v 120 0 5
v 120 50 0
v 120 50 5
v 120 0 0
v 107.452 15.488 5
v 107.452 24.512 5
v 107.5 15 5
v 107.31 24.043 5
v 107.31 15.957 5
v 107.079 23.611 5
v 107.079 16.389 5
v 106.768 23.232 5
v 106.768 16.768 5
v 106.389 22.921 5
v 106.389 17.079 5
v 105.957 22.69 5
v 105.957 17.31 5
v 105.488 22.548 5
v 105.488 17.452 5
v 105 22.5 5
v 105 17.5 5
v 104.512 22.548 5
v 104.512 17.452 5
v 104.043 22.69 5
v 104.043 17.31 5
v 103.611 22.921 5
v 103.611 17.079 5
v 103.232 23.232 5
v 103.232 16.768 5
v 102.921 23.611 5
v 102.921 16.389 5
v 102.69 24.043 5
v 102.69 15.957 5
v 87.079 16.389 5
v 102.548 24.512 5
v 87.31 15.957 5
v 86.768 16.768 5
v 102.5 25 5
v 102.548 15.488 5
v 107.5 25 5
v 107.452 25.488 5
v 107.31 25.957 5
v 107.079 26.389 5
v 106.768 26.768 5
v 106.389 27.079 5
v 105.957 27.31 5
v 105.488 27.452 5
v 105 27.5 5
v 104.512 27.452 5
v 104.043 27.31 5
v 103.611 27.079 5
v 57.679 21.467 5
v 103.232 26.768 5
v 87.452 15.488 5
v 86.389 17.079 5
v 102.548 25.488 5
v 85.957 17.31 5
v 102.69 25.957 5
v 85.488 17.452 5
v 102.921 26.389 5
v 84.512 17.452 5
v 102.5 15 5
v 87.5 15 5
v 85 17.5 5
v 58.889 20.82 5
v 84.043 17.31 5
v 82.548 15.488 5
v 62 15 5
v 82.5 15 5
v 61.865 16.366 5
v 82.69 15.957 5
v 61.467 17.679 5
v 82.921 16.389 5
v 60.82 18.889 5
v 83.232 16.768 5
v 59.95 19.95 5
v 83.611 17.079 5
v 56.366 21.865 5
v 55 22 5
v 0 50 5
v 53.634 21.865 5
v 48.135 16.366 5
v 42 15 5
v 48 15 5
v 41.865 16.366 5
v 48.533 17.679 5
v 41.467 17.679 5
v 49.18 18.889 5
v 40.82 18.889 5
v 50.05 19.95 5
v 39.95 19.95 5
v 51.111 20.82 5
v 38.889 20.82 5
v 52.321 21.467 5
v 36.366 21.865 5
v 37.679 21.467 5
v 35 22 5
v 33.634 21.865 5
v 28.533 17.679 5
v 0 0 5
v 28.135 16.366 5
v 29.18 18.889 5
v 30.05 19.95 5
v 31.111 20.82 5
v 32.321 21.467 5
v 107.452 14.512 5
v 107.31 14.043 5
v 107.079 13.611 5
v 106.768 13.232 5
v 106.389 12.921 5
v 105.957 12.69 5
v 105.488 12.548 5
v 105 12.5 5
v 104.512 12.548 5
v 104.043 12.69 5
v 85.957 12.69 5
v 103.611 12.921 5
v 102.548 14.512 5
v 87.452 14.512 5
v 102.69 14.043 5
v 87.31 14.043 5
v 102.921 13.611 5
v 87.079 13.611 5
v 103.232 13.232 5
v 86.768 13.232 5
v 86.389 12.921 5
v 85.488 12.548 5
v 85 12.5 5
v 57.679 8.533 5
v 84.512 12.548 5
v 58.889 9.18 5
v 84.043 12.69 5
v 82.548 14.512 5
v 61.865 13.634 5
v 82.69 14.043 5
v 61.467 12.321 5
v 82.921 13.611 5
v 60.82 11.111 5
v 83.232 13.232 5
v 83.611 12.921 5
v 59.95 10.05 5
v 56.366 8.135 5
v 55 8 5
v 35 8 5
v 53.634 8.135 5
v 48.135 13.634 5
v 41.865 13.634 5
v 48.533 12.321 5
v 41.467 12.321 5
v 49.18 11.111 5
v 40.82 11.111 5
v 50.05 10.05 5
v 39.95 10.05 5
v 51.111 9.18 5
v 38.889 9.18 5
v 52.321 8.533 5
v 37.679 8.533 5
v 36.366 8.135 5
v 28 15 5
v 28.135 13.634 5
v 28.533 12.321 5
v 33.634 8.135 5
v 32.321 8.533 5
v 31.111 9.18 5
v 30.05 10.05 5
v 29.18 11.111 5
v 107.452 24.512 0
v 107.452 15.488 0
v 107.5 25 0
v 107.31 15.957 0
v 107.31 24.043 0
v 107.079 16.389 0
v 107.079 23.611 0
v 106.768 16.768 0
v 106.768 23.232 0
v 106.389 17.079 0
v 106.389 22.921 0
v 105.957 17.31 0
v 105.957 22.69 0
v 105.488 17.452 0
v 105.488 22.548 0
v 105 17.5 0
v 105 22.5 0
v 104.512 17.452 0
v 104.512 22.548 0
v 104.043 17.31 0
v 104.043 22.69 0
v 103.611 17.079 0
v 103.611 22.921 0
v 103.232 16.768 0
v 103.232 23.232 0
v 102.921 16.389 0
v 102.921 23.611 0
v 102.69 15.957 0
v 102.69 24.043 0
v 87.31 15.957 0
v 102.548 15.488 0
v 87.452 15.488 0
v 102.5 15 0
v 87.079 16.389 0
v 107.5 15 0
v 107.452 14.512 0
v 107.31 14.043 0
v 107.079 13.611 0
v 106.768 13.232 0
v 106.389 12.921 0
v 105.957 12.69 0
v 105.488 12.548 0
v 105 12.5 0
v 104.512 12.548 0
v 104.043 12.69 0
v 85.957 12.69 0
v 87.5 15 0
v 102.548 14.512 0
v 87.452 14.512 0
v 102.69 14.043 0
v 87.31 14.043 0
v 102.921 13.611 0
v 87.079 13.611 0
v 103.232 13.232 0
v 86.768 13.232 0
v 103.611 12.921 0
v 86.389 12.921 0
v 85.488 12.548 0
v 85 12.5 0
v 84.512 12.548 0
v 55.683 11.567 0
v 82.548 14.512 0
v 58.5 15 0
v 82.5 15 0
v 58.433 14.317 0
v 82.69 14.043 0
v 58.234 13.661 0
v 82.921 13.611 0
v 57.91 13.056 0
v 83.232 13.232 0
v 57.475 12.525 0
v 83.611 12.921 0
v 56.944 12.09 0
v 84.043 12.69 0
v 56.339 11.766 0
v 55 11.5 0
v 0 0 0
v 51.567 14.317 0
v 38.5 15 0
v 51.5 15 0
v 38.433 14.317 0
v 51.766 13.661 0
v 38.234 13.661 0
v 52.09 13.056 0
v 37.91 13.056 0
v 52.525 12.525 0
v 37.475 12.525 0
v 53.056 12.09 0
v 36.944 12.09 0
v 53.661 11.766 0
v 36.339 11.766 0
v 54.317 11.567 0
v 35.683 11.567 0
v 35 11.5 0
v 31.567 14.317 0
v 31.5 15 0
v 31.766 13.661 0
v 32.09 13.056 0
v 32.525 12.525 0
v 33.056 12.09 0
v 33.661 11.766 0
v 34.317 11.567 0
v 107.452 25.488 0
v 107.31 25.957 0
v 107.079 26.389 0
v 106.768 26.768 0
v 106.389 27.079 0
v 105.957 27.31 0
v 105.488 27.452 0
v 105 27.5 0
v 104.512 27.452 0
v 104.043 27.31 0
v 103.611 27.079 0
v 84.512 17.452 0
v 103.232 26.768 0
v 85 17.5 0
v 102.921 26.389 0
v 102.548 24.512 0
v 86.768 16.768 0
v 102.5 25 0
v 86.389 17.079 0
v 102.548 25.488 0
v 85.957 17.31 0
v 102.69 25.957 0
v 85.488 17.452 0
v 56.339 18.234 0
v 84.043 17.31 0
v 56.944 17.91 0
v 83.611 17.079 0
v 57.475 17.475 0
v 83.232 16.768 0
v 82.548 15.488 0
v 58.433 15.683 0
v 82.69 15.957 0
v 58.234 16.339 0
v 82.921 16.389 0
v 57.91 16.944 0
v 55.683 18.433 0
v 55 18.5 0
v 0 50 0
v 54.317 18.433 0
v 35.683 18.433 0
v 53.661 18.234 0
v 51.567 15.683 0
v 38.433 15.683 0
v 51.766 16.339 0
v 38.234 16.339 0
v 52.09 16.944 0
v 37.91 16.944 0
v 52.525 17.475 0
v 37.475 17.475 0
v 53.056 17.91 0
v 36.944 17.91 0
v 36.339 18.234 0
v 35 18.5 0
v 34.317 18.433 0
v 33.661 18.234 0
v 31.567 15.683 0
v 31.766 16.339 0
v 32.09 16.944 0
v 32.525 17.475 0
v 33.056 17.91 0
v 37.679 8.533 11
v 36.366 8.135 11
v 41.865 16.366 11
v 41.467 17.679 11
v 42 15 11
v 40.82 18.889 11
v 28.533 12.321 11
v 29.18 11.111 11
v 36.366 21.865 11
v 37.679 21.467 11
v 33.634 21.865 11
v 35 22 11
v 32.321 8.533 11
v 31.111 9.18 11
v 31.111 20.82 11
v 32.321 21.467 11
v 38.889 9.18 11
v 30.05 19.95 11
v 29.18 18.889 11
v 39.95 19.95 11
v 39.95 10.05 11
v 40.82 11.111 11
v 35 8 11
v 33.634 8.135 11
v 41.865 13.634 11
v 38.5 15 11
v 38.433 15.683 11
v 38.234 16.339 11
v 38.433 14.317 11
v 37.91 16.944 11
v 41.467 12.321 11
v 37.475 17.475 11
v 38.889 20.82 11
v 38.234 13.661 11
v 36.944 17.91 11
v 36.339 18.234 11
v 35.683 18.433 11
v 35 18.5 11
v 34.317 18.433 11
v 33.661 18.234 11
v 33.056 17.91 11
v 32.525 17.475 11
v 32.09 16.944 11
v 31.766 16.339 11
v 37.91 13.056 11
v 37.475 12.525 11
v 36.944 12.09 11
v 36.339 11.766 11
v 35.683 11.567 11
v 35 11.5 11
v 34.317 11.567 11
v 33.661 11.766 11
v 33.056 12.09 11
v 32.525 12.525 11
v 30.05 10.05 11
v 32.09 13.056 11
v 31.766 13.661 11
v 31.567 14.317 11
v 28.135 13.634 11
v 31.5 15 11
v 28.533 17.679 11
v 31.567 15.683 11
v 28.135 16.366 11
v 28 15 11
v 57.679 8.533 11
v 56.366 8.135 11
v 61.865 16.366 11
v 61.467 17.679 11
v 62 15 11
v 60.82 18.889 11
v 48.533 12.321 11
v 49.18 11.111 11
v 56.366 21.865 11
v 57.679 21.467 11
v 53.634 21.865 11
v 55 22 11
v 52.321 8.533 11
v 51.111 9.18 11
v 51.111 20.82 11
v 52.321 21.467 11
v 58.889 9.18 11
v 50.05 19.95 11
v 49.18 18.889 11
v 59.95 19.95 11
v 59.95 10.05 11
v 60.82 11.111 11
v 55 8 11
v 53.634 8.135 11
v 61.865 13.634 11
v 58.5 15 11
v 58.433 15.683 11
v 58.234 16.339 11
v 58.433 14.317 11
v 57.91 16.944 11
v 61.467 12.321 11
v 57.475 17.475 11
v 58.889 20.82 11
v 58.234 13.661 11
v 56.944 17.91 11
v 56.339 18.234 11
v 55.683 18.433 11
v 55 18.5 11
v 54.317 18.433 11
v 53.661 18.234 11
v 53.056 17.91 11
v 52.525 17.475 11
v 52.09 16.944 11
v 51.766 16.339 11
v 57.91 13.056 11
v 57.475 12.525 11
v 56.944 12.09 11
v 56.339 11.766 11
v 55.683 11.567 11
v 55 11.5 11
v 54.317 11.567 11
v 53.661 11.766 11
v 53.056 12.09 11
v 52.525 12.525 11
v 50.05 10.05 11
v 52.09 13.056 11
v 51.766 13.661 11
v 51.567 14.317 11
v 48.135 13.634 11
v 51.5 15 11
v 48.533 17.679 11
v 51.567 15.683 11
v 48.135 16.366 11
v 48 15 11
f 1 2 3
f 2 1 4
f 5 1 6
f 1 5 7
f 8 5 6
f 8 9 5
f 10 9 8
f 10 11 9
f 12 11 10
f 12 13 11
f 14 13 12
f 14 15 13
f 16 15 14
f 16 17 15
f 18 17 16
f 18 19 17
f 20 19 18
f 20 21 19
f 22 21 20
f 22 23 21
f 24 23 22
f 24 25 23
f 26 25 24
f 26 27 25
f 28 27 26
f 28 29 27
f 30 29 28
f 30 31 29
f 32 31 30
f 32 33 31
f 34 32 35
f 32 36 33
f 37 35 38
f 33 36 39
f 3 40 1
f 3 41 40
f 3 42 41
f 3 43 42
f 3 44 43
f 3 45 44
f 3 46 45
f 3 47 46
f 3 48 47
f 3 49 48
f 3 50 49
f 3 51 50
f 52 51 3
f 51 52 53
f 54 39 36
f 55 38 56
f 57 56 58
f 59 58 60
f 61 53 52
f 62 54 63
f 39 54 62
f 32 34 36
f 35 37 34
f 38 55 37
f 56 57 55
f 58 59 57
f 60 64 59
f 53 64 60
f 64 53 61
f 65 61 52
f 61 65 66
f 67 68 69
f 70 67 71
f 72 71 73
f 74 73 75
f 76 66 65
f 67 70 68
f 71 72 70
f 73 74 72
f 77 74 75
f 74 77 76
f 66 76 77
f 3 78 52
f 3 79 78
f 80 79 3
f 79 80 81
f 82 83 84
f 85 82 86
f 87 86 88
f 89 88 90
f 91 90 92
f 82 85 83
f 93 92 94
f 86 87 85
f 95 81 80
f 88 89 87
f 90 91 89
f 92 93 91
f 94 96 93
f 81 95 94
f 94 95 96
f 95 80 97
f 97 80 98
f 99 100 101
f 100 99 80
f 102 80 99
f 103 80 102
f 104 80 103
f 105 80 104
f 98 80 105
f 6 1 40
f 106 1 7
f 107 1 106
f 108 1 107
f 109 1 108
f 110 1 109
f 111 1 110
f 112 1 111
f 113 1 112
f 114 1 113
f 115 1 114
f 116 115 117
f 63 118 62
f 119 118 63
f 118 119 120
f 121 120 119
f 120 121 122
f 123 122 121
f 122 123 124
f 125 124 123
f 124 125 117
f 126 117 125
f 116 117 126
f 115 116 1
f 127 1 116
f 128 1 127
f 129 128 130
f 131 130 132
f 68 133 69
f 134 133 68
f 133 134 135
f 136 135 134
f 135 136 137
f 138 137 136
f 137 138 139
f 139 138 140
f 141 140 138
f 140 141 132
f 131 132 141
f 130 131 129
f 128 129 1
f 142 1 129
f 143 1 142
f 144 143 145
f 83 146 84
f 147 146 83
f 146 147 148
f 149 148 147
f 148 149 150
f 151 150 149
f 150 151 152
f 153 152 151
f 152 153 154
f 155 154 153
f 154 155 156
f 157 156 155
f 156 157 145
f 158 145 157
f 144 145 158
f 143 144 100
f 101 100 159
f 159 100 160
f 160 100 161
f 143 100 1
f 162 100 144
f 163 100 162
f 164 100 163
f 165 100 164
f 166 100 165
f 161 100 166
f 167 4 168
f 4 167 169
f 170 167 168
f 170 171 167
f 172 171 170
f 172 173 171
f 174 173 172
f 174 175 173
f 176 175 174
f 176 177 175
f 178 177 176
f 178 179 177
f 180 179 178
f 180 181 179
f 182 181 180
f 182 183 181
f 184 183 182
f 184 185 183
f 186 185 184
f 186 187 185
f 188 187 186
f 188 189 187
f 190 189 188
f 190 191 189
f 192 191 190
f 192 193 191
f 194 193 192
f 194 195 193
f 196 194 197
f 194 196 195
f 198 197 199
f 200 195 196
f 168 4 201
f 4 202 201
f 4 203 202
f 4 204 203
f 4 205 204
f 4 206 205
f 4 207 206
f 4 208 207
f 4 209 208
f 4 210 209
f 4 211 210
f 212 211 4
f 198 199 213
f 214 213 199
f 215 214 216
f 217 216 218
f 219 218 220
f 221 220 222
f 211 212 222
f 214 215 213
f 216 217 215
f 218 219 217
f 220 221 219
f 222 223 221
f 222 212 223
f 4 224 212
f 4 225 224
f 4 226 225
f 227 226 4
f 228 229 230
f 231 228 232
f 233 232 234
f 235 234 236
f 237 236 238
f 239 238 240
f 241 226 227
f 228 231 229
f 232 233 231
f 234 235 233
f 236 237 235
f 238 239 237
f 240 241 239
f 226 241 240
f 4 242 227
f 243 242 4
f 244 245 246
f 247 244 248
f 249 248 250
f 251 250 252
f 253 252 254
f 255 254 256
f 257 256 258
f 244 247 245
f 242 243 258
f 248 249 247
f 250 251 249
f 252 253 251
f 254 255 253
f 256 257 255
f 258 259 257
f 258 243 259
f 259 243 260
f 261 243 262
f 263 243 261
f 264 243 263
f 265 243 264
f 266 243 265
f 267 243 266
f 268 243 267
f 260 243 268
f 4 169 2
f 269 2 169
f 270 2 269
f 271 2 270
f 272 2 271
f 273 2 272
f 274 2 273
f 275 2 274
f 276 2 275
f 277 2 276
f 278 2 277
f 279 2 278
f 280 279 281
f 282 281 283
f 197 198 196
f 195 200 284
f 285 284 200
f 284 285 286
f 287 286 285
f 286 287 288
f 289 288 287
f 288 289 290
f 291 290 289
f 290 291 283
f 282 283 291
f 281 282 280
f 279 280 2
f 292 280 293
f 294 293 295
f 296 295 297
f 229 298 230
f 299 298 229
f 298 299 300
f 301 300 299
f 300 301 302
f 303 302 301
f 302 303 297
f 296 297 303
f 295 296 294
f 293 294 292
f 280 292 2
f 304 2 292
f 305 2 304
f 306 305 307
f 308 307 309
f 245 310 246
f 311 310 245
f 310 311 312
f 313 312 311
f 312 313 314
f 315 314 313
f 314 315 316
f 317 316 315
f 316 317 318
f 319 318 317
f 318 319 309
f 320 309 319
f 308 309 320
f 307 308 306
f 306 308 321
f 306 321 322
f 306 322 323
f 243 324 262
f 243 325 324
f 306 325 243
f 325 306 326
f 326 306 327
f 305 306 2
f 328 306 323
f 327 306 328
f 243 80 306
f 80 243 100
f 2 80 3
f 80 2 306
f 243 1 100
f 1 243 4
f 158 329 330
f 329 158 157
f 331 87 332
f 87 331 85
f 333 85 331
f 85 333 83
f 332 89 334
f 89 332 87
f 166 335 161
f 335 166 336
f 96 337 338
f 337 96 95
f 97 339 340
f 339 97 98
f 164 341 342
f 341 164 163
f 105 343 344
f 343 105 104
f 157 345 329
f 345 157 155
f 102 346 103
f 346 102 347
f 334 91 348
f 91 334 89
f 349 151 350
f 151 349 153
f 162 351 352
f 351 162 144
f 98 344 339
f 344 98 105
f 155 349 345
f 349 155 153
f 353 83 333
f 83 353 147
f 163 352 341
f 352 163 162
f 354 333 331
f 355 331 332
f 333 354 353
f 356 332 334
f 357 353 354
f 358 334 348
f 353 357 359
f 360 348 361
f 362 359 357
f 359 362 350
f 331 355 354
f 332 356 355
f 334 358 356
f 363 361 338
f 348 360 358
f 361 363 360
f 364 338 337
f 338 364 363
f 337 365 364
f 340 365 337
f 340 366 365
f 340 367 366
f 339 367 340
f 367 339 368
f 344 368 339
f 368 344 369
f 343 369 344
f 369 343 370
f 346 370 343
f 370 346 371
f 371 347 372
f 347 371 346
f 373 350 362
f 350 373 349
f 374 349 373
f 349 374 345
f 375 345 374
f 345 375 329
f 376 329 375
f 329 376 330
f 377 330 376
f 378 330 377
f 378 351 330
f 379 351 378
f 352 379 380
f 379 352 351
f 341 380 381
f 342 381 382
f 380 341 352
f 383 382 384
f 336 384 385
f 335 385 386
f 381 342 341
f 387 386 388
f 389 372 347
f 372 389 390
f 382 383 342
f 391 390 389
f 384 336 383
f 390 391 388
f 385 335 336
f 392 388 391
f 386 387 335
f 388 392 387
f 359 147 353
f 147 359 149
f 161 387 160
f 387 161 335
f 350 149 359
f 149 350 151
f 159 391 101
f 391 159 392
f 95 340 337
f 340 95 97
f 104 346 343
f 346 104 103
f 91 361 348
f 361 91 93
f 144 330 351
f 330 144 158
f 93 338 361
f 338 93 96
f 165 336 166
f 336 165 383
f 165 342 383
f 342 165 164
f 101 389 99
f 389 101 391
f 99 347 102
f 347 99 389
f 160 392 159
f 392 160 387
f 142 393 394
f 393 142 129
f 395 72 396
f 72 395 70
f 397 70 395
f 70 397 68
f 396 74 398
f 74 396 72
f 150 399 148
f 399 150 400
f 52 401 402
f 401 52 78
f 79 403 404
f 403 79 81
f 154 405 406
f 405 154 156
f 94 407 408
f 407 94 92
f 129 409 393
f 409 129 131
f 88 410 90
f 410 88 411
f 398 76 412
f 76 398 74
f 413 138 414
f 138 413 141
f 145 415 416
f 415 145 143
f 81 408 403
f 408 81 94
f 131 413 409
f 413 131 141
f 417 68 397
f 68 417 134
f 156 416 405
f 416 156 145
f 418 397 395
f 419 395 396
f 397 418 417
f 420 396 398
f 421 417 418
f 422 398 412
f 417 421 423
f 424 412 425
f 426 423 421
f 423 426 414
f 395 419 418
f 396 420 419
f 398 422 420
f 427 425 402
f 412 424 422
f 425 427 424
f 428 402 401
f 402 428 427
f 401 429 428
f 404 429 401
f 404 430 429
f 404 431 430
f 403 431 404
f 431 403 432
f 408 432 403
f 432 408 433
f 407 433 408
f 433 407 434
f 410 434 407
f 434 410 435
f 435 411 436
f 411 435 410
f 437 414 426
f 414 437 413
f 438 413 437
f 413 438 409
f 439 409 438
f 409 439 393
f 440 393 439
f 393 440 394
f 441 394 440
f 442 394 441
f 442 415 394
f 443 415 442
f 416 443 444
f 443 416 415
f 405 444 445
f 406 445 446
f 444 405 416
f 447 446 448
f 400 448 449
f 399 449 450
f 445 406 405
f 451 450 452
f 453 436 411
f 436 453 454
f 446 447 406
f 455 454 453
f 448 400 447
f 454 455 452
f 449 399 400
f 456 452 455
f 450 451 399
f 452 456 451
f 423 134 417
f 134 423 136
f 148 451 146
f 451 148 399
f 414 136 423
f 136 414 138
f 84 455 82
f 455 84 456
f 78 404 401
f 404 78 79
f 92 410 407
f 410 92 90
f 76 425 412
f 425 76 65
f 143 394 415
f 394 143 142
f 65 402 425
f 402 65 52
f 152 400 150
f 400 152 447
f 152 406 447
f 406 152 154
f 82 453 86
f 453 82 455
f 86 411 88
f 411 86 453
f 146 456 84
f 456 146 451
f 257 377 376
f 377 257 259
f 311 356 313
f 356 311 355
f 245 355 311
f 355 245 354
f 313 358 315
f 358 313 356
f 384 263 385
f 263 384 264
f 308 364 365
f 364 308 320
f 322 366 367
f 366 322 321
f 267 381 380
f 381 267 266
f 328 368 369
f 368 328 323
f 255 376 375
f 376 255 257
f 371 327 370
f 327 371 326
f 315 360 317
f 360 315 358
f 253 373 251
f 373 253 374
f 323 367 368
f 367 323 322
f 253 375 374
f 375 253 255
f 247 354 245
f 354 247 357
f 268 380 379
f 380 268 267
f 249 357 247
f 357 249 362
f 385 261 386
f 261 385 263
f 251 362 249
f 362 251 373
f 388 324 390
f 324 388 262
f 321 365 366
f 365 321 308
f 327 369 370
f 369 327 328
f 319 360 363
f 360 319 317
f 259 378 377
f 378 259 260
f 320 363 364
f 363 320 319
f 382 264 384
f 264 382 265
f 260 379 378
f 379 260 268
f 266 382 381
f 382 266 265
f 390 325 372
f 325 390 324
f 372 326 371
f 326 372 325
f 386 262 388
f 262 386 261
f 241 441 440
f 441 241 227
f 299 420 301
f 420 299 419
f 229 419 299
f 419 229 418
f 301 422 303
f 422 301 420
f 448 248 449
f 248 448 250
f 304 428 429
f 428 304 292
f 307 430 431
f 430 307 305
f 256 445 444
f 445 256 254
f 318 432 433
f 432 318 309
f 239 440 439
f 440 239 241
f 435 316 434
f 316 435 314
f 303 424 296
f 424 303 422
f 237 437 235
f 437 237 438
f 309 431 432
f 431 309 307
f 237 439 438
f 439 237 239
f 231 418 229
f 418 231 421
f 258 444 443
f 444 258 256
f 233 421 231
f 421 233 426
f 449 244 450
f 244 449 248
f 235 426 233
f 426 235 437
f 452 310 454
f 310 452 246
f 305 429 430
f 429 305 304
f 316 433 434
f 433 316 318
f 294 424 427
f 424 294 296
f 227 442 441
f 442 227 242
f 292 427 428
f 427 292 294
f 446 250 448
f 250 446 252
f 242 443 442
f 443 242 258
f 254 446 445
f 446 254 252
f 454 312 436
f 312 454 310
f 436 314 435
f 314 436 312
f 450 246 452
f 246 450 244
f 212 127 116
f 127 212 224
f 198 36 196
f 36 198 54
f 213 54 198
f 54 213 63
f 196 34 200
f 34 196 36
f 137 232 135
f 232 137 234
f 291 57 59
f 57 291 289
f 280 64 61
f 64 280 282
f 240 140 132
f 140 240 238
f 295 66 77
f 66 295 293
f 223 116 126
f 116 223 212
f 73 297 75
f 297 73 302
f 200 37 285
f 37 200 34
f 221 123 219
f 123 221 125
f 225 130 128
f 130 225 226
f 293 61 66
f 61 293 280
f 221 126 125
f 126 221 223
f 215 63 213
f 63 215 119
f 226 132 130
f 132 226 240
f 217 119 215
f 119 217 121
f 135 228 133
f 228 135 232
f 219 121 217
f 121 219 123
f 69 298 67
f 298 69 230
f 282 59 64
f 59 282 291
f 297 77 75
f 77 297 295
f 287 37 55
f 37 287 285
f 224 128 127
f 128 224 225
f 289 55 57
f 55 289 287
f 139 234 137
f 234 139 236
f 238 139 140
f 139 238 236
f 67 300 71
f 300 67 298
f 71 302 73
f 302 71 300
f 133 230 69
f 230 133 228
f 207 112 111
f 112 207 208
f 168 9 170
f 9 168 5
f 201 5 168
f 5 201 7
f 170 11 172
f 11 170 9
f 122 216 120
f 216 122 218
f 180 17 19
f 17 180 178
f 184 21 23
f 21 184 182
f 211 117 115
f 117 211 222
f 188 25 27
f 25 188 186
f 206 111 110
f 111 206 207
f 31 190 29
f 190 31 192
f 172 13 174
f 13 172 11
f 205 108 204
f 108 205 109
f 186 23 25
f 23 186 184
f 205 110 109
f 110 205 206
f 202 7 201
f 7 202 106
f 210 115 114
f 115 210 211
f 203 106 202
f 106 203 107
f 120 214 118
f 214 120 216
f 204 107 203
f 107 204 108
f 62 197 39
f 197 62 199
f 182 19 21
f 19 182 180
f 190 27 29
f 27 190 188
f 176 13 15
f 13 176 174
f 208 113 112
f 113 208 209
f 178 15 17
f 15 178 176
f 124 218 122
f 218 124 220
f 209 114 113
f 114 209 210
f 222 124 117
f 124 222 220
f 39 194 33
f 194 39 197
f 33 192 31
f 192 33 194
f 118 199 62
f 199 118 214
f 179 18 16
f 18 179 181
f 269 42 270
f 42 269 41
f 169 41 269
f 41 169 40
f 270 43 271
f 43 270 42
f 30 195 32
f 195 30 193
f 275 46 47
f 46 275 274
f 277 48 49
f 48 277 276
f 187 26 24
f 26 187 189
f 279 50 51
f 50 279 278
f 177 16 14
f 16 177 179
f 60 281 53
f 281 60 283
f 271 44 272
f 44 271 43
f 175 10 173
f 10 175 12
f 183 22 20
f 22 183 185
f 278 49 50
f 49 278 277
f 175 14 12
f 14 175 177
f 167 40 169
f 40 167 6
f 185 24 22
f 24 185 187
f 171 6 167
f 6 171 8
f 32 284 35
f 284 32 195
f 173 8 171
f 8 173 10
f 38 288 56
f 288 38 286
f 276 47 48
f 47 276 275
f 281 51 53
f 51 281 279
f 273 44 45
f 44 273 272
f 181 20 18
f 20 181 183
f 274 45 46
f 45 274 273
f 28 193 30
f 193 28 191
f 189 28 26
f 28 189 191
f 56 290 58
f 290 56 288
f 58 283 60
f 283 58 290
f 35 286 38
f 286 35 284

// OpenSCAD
$fn = 32;

// ----------------------------------------------------------------------
// Mixed field: bosses and holes at given coordinates
// ----------------------------------------------------------------------

// --- parameters (mm) ---
plate_l = 120;            // plate length, X
plate_w = 50;             // plate width, Y
plate_t = 5;              // plate thickness, Z
boss_d = 14;              // boss diameter
boss_h = 6;               // boss height above the plate
hole_d = 5;               // through hole diameter

total_h = plate_t + boss_h;  // overall height

difference() {
  union() {
    cube([plate_l, plate_w, plate_t]);
    translate([35, 15, plate_t]) cylinder(h = boss_h, d = boss_d);
    translate([55, 15, plate_t]) cylinder(h = boss_h, d = boss_d);
  }
  translate([35, 15, -1]) cylinder(h = total_h + 2, d = boss_d / 2);
  translate([55, 15, -1]) cylinder(h = total_h + 2, d = boss_d / 2);
  translate([85, 15, -1]) cylinder(h = plate_t + 2, d = hole_d);
  translate([105, 15, -1]) cylinder(h = plate_t + 2, d = hole_d);
  translate([105, 25, -1]) cylinder(h = plate_t + 2, d = hole_d);
}
